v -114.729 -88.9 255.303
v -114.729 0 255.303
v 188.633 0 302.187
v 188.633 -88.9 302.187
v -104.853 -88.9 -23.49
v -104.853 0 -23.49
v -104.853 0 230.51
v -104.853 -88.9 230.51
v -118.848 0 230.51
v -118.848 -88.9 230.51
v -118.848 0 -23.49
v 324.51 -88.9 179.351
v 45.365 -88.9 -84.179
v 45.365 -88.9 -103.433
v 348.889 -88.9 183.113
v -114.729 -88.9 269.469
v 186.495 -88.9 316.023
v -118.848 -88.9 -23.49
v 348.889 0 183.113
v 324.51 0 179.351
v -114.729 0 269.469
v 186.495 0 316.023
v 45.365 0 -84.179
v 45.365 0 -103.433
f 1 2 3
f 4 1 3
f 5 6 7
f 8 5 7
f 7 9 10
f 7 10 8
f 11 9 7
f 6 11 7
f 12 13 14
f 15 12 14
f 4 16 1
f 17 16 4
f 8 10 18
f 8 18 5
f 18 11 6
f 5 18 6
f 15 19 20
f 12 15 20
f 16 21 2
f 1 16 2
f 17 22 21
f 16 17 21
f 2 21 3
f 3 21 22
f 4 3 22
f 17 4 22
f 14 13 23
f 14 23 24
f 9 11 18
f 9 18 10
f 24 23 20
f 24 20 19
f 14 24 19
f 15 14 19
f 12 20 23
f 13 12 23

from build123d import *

# Parameters (mm, degrees)
F3_DEPTH = 88.9
F1_W     = 13.9954
F1_H     = 254
F4_DEPTH = 88.9
F5_DEPTH = 88.9


with BuildPart() as f3:
    # F2 (on Front) → F3 (new body)
    with BuildSketch(Plane.XZ):
        Polygon((186.494876, 316.02254), (-114.728962, 269.46892), (-114.728962, 255.302711), (188.633165, 302.186799), align=None)
    extrude(amount=F3_DEPTH)


with BuildPart() as f4:
    # F1 (on Front) → F4 (new body)
    with BuildSketch(Plane.XZ):
        with Locations((-111.850536, 103.510289)):
            Rectangle(F1_W, F1_H)
    extrude(amount=F4_DEPTH)


with BuildPart() as f5:
    # F0 (on Front) → F5 (new body)
    with BuildSketch(Plane.XZ):
        Polygon((45.364792, -103.432538), (348.889265, 183.113473), (324.510112, 179.351234), (45.364792, -84.179338), align=None)
    extrude(amount=F5_DEPTH)


solid = Compound([f3.part, f4.part, f5.part])
